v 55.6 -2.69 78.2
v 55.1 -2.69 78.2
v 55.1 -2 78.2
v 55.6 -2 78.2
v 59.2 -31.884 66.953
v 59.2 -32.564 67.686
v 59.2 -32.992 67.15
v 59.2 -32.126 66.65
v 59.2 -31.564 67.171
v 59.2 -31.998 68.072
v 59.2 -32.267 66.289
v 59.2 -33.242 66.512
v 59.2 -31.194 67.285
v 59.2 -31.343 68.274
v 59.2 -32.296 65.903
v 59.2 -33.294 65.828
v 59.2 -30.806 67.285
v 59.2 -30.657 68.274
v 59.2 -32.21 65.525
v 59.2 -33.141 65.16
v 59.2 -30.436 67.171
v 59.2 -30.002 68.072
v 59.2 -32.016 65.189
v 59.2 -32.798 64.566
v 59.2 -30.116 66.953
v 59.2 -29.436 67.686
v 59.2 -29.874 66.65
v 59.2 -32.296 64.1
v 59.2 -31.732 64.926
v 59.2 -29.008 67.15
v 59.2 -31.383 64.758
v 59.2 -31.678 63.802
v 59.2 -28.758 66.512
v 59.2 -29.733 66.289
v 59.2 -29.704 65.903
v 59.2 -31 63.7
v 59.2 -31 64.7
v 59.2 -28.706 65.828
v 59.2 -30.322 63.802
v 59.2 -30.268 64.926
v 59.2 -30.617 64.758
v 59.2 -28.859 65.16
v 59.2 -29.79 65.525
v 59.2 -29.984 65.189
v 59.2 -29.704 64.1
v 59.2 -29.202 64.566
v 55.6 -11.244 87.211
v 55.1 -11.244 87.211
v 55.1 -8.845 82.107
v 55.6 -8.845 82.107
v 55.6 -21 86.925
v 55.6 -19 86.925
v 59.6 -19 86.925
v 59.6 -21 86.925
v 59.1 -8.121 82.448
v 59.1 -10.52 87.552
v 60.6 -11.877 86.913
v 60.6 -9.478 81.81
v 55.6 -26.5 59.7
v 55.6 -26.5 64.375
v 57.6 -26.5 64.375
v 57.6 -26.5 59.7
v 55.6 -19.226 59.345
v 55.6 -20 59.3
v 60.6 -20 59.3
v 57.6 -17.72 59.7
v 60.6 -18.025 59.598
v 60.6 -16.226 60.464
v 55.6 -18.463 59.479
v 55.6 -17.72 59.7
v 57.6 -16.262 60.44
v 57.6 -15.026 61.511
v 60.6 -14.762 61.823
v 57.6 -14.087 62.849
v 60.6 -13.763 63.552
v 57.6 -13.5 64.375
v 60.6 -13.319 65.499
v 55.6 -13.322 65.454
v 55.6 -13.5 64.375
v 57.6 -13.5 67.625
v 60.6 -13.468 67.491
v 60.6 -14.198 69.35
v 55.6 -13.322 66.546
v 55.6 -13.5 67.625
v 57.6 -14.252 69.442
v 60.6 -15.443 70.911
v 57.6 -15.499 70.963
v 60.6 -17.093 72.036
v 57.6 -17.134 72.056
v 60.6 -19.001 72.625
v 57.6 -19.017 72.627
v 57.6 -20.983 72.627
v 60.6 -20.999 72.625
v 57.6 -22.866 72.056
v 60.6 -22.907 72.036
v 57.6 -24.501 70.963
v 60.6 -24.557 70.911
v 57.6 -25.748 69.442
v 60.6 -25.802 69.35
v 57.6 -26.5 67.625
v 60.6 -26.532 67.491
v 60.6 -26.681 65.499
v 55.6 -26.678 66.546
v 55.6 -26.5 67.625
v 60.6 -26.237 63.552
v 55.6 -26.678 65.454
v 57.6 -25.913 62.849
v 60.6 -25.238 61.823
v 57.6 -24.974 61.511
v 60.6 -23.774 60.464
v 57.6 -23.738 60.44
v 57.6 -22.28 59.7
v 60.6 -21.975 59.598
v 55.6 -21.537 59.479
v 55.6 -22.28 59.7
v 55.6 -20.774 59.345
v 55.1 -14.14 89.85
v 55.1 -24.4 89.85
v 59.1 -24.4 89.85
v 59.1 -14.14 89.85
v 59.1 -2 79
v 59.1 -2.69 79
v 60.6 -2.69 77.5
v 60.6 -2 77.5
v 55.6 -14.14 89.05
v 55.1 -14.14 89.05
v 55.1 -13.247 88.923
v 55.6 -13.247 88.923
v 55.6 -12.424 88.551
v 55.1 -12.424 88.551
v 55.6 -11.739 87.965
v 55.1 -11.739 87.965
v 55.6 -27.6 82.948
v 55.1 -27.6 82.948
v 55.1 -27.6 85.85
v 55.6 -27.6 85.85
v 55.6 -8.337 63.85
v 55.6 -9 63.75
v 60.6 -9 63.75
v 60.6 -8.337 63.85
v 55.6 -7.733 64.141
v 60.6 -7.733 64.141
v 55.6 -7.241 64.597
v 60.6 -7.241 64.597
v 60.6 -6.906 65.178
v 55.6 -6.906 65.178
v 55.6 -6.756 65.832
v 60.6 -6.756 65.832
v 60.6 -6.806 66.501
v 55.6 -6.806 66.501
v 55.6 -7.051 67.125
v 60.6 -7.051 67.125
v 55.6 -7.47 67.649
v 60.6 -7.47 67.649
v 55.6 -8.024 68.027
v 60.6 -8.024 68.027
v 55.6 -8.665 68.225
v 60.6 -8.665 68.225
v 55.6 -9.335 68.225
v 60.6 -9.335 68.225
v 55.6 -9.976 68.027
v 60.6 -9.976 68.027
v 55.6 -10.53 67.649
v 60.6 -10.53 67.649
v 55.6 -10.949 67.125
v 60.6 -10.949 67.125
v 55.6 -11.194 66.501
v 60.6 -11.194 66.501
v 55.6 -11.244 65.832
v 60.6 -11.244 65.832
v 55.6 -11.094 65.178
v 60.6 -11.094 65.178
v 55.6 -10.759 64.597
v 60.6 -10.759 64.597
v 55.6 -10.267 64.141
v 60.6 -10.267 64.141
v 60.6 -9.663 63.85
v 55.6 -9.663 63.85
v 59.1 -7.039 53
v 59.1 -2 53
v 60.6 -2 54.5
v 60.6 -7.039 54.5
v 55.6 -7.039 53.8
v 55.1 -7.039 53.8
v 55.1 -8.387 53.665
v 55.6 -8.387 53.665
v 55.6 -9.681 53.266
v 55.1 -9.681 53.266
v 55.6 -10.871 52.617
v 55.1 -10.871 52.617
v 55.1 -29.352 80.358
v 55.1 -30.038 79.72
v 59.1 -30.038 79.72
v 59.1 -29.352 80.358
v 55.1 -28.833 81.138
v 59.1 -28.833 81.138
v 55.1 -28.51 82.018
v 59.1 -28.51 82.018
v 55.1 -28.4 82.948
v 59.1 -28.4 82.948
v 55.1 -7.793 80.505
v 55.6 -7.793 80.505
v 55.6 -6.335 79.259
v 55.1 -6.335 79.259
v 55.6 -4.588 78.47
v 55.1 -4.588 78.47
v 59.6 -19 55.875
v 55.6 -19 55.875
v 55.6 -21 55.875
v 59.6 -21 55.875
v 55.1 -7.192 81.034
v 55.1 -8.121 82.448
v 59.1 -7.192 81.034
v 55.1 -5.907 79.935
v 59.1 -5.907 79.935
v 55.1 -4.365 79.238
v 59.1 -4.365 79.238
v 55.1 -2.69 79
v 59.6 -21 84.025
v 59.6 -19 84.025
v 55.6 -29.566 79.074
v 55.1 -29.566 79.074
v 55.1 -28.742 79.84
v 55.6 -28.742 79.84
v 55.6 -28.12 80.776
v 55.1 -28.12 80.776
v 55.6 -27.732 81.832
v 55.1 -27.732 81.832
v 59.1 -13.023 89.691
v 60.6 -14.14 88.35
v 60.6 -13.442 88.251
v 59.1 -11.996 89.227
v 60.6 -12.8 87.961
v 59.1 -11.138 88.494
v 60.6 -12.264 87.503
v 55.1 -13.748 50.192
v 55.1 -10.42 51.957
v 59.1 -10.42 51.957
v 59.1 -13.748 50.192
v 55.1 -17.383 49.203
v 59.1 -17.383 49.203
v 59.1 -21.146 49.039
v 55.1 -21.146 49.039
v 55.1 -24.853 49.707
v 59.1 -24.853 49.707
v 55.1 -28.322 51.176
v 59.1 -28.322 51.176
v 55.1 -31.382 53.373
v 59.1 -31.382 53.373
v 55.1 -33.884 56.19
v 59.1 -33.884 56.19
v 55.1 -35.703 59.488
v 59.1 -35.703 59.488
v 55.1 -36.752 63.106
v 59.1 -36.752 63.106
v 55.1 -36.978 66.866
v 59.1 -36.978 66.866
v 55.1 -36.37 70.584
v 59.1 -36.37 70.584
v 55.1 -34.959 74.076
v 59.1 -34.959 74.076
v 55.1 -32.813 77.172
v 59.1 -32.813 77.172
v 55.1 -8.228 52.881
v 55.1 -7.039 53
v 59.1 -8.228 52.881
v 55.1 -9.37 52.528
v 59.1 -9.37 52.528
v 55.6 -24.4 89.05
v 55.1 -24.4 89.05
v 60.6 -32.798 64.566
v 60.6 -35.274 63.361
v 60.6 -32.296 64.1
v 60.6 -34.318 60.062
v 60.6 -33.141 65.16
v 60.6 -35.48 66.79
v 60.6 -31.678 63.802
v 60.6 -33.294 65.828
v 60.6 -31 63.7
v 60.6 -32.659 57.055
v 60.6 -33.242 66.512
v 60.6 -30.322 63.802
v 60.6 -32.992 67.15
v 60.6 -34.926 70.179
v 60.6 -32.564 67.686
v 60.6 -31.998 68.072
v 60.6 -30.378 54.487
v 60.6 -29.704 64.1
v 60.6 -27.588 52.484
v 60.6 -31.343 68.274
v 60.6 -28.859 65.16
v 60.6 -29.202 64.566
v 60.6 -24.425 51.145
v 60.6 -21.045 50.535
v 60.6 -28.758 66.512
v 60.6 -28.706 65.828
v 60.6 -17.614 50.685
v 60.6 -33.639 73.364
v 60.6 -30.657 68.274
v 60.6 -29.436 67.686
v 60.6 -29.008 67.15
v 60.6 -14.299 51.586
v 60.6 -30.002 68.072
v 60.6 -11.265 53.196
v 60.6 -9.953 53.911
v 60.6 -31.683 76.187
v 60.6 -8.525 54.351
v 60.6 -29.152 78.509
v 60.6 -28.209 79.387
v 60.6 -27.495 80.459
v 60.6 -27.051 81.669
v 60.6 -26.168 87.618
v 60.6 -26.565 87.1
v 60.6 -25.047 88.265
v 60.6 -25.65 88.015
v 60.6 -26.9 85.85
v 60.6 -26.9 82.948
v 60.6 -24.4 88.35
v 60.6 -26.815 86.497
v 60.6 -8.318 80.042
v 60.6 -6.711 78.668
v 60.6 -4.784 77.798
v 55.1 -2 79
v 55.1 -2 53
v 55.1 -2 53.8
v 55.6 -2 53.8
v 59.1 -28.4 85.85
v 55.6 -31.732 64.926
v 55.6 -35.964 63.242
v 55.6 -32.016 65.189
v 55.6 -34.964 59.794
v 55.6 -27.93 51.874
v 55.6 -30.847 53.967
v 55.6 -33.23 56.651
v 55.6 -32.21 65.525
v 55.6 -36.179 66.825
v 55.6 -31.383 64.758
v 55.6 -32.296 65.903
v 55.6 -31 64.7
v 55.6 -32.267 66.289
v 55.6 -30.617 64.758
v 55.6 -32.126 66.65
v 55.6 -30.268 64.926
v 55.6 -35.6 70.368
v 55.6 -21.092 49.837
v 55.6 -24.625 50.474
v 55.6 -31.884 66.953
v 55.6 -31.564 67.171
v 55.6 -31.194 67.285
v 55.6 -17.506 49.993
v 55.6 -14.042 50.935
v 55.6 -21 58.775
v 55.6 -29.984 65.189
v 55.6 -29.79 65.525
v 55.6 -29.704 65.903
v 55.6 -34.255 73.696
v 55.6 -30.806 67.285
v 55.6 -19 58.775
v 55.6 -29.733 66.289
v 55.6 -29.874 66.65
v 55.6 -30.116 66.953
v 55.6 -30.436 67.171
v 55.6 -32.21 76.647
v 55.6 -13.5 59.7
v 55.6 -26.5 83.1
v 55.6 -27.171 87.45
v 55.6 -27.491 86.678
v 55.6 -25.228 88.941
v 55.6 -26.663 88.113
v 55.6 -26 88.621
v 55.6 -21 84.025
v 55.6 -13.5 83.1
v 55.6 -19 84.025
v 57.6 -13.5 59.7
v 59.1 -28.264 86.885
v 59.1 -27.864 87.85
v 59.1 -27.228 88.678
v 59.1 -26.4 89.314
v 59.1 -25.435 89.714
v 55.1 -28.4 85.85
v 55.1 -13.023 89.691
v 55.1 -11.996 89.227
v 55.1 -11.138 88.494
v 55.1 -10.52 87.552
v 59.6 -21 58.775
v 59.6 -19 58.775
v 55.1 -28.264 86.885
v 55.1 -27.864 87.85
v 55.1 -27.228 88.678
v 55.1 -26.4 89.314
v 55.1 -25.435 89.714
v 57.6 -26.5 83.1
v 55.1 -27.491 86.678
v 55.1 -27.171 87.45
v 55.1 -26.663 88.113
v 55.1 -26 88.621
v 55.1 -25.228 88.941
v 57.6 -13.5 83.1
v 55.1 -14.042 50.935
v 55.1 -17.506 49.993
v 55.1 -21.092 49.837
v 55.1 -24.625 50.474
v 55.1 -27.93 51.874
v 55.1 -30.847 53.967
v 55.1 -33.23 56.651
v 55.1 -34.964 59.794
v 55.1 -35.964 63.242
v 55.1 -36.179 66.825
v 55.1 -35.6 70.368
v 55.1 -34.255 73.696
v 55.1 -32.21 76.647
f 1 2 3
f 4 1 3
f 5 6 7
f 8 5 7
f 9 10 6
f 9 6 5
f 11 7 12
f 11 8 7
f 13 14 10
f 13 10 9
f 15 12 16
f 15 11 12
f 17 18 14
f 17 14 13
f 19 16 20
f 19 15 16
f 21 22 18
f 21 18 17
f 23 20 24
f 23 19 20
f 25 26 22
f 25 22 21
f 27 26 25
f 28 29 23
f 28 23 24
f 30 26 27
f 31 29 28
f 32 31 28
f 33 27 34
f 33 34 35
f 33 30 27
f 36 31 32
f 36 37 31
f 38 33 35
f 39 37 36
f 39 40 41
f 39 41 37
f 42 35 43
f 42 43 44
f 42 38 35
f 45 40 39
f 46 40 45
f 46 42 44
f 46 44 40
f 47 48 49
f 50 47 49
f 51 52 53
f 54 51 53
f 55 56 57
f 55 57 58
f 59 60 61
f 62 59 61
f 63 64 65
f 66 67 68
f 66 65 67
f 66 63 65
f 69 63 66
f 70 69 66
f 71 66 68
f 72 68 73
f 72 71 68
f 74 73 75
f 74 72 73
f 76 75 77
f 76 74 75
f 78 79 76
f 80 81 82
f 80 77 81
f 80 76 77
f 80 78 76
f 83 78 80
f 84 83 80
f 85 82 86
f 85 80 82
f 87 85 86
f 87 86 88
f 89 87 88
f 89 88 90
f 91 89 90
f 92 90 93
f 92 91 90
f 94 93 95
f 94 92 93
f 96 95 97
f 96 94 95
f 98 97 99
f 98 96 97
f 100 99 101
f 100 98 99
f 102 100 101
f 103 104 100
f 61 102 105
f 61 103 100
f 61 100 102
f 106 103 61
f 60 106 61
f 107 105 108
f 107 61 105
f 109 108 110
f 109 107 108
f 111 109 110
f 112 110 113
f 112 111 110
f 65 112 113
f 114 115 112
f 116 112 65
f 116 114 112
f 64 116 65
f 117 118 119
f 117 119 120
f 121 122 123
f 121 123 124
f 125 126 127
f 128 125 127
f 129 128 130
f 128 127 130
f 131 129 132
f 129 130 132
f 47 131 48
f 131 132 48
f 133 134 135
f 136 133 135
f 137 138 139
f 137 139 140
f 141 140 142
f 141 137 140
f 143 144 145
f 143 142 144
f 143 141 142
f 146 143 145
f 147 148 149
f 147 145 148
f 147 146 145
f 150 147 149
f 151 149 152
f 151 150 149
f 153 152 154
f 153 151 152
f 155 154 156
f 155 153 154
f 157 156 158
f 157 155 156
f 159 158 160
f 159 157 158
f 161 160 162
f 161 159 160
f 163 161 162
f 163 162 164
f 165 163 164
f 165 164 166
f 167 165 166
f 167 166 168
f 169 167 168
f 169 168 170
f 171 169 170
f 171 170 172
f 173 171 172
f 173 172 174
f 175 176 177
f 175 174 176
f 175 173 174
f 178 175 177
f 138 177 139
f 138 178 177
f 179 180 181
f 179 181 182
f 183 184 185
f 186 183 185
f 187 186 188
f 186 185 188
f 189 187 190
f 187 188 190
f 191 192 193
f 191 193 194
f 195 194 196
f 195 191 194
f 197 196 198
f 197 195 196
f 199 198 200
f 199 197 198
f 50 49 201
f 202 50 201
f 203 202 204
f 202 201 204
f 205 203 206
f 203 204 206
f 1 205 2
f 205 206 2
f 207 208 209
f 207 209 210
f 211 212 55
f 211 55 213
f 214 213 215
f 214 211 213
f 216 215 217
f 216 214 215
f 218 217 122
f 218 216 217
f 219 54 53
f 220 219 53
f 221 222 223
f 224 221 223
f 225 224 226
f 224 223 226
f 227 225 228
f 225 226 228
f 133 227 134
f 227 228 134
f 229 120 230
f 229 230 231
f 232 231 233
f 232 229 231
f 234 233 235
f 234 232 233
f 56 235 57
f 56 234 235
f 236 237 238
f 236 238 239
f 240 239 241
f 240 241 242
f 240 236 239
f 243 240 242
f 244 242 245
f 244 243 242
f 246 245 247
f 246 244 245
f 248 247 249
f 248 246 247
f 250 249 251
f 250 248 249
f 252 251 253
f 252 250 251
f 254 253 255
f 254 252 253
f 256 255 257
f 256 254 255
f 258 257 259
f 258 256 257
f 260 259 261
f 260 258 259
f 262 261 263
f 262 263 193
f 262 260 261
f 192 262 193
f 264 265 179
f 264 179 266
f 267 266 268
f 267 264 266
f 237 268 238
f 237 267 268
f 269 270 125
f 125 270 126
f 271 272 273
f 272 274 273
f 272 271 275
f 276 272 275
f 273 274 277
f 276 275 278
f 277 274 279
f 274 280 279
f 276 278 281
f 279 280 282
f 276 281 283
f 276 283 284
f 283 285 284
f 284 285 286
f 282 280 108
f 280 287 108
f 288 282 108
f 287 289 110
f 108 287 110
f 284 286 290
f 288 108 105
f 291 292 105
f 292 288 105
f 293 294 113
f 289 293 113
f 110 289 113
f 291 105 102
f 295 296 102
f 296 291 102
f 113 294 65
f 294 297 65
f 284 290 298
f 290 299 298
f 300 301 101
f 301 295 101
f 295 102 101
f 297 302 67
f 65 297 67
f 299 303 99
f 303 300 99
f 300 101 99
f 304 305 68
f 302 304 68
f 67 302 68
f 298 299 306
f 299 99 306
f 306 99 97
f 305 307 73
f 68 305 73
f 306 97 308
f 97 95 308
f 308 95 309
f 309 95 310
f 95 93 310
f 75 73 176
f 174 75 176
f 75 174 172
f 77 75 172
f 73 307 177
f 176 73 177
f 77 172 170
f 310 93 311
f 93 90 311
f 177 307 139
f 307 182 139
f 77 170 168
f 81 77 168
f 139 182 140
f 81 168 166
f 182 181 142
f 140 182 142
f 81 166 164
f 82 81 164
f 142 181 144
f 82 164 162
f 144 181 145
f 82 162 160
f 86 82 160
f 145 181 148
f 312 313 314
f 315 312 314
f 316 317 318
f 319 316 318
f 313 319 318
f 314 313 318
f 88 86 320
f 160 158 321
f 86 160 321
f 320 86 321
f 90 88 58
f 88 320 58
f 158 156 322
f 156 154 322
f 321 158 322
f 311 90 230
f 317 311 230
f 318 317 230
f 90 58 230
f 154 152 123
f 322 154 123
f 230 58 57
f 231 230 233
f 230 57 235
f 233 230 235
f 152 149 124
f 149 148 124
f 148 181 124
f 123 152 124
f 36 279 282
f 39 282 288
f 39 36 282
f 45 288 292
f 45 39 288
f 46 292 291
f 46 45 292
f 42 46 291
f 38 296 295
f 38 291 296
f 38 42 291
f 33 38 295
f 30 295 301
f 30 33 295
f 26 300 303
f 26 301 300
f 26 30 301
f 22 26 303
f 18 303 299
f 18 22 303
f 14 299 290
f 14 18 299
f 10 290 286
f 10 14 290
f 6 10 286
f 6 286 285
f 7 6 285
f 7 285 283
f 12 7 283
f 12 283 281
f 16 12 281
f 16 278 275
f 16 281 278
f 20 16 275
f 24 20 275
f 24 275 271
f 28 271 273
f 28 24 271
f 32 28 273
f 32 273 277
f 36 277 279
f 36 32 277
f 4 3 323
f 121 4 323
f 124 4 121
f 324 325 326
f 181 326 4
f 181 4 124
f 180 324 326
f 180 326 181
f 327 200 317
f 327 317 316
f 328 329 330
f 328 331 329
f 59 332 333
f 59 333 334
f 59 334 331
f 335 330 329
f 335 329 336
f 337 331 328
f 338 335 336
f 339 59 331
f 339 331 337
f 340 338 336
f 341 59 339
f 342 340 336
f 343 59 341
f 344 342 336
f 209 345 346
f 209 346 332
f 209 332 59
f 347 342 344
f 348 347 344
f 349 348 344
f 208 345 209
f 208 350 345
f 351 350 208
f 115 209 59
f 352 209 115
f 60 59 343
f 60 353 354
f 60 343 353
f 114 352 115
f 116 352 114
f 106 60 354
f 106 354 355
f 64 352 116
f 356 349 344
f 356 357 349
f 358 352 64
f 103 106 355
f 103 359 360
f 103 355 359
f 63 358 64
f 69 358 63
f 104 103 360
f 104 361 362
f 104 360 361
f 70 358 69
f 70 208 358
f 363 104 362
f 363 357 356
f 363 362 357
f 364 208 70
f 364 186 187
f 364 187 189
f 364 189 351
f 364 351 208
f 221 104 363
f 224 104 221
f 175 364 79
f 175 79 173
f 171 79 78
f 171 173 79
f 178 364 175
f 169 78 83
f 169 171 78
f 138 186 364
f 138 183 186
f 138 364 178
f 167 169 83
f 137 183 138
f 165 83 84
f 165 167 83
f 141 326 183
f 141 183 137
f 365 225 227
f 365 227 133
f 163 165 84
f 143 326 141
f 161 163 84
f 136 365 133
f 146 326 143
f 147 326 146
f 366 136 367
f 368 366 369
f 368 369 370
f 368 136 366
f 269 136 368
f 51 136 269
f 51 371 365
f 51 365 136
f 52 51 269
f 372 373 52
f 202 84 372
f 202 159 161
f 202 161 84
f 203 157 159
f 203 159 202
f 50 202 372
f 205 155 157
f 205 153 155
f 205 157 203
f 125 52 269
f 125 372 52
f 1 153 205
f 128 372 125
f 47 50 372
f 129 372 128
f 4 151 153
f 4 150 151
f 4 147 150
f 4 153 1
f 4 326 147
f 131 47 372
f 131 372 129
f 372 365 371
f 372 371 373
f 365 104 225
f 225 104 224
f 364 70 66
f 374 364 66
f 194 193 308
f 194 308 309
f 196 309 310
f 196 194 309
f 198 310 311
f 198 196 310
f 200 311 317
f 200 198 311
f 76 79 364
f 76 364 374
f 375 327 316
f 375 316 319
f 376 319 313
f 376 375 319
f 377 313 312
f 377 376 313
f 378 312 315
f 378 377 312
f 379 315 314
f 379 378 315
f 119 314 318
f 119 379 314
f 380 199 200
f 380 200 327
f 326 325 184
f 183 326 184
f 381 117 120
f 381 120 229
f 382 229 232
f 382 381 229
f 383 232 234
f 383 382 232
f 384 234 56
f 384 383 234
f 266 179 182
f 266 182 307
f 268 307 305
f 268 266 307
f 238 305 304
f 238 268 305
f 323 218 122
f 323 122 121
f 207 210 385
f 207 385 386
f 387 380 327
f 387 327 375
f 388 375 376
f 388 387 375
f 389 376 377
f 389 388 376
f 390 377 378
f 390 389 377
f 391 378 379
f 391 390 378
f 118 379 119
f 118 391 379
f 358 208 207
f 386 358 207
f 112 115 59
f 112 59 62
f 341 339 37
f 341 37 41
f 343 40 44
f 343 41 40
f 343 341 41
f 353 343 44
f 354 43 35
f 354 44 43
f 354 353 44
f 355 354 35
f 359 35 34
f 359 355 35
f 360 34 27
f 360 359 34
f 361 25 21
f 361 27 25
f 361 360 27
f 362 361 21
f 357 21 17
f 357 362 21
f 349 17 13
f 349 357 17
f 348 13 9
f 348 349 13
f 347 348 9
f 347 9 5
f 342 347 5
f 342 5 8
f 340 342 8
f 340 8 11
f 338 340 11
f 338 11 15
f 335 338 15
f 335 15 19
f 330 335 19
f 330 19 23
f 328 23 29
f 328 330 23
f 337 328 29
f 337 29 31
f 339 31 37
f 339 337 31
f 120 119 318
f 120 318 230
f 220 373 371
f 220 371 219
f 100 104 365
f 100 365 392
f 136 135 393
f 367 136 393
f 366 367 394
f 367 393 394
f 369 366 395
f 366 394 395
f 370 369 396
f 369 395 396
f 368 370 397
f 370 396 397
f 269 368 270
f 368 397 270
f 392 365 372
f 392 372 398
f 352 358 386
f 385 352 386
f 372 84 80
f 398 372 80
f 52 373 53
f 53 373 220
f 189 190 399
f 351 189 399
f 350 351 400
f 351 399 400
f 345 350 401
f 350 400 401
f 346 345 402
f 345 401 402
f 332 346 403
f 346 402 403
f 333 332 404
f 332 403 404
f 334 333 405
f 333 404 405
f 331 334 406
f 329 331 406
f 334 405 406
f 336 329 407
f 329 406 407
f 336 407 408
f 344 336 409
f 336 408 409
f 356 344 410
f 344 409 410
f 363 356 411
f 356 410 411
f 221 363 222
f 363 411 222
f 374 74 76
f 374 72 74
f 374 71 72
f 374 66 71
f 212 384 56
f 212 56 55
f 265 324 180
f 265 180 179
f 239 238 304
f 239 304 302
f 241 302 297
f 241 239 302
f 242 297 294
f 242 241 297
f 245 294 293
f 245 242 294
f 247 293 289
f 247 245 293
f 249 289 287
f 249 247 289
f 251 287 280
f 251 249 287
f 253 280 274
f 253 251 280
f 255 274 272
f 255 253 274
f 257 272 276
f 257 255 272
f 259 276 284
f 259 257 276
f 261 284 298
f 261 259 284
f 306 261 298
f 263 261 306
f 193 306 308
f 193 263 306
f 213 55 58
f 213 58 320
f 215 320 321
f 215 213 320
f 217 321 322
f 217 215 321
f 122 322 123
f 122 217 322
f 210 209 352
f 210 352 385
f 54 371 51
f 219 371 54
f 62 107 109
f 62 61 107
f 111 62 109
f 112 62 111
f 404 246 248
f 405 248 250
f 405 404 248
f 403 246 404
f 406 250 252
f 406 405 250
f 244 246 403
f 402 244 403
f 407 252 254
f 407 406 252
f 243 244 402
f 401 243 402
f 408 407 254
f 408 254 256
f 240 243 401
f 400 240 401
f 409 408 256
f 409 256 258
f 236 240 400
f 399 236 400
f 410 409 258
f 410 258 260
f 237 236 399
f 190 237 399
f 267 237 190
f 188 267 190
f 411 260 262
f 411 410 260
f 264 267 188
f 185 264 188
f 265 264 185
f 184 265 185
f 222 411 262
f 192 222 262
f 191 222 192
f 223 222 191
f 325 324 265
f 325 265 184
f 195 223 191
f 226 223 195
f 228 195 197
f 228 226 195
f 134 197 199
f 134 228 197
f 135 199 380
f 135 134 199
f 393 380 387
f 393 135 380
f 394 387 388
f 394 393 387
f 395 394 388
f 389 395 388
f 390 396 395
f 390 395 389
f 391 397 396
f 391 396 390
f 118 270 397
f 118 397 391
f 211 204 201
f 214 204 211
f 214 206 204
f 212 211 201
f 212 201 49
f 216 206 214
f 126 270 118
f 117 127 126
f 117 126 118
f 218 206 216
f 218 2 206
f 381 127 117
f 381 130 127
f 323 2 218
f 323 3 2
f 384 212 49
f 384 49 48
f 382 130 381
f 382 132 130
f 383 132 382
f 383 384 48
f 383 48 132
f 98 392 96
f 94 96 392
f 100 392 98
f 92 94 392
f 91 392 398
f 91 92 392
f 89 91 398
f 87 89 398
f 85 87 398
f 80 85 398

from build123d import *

# Parameters (mm, degrees)
BOSS_EXTRUDE1_START  = 55.1
BOSS_EXTRUDE1_DEPTH  = 5.5
BOSS_EXTRUDE2_START  = 55
BOSS_EXTRUDE2_DEPTH  = 0.6
CHAMFER1_SIZE        = 1.5
BOSS_EXTRUDE3_START  = 55.875
SKETCH3_W            = 4.1
SKETCH3_H            = 2
BOSS_EXTRUDE3_DEPTH  = 2.9
BOSS_EXTRUDE4_START  = 84.025
SKETCH4_W            = 4.1
SKETCH4_H            = 2
BOSS_EXTRUDE4_DEPTH  = 2.9
BOSS_EXTRUDE5_START  = 59.7
SKETCH5_W            = 2.1
SKETCH5_H            = 13
BOSS_EXTRUDE5_DEPTH  = 23.4
BOSS_EXTRUDE6_START  = 55.5
SKETCH6_R            = 6.7
BOSS_EXTRUDE6_DEPTH  = 5.6
BOSS_EXTRUDE7_START  = 55.5
SKETCH7_R            = 2.25
BOSS_EXTRUDE7_DEPTH  = 5.6
BOSS_EXTRUDE8_START  = 59.2
SKETCH8_R            = 2.3
BOSS_EXTRUDE8_DEPTH  = 1.9
BOSS_EXTRUDE9_START  = 55.5
SKETCH9_R            = 1.3
BOSS_EXTRUDE9_DEPTH  = 3.75
BOSS_EXTRUDE10_START = 26
SKETCH10_W           = 30
SKETCH10_H           = 62
BOSS_EXTRUDE10_DEPTH = 80


with BuildPart() as part:
    # Sketch1 → Boss-Extrude1 (new body)
    with BuildSketch(Plane(origin=(0, 0, 0), x_dir=(0, 0, -1), z_dir=(1, 0, 0)).offset(BOSS_EXTRUDE1_START)):
        with BuildLine():
            Line((-53, 3.337121701), (-53, -7.038518603))
            ThreePointArc((-53, -7.038518603), (-52.733198515, -8.807822077), (-51.956521739, -10.41977462))
            ThreePointArc((-51.956521739, -10.41977462), (-56.18950583, -33.883594784), (-79.719936005, -30.038095238))
            ThreePointArc((-79.719936005, -30.038095238), (-81.138131249, -28.832955071), (-82.948156242, -28.4))
            Line((-82.948156242, -28.4), (-85.85, -28.4))
            ThreePointArc((-85.85, -28.4), (-88.678427125, -27.228427125), (-89.85, -24.4))
            Line((-89.85, -24.4), (-89.85, -14.139667829))
            ThreePointArc((-89.85, -14.139667829), (-89.226856881, -11.995644133), (-87.551581196, -10.519637244))
            Line((-87.551581196, -10.519637244), (-82.447628205, -8.120544133))
            ThreePointArc((-82.447628205, -8.120544133), (-79.934714679, -5.9065338), (-79, -2.690498257))
            Line((-79, -2.690498257), (-79, 3.337121701))
            ThreePointArc((-79, 3.337121701), (-79.321091654, 5.273613374), (-80.25, 7.002841276))
            ThreePointArc((-80.25, 7.002841276), (-66, 36), (-51.75, 7.002841276))
            ThreePointArc((-51.75, 7.002841276), (-52.678908346, 5.273613374), (-53, 3.337121701))
        make_face()
    extrude(amount=BOSS_EXTRUDE1_DEPTH)


with BuildPart() as body_2:
    # Sketch2 → Boss-Extrude2 (new body)
    with BuildSketch(Plane(origin=(0, 0, 0), x_dir=(0, 0, -1), z_dir=(1, 0, 0)).offset(BOSS_EXTRUDE2_START)):
        with BuildLine():
            Line((-53.8, 3.337121701), (-53.8, -7.038518603))
            ThreePointArc((-53.8, -7.038518603), (-53.497624984, -9.043729207), (-52.617391304, -10.870608755))
            ThreePointArc((-52.617391304, -10.870608755), (-56.651176143, -33.230249147), (-79.074291958, -29.565714286))
            ThreePointArc((-79.074291958, -29.565714286), (-80.77612625, -28.119546085), (-82.948156242, -27.6))
            Line((-82.948156242, -27.6), (-85.85, -27.6))
            ThreePointArc((-85.85, -27.6), (-88.1127417, -26.6627417), (-89.05, -24.4))
            Line((-89.05, -24.4), (-89.05, -14.139667829))
            ThreePointArc((-89.05, -14.139667829), (-88.551485505, -12.424448872), (-87.211264957, -11.243643361))
            Line((-87.211264957, -11.243643361), (-82.107311966, -8.84455025))
            ThreePointArc((-82.107311966, -8.84455025), (-79.259343303, -6.335338539), (-78.2, -2.690498257))
            Line((-78.2, -2.690498257), (-78.2, 3.337121701))
            ThreePointArc((-78.2, 3.337121701), (-78.563903875, 5.531812264), (-79.616666667, 7.491603886))
            ThreePointArc((-79.616666667, 7.491603886), (-66, 35.2), (-52.383333333, 7.491603886))
            ThreePointArc((-52.383333333, 7.491603886), (-53.436096125, 5.531812264), (-53.8, 3.337121701))
        make_face()
    extrude(amount=BOSS_EXTRUDE2_DEPTH)


with BuildPart() as part_1:
    add(part.part)

    # Combine1: cut body 2
    add(body_2.part, mode=Mode.SUBTRACT)

    # Chamfer1
    chamfer1_edges = [part_1.edges().sort_by_distance(p)[0] for p in [
        (60.6, -5.9065338, 79.934714679),
        (60.6, -9.320090689, 84.999604701),
        (60.6, -11.995644133, 89.226856881),
        (60.6, -19.269833914, 89.85),
        (60.6, -27.228427125, 88.678427125),
        (60.6, -28.4, 84.399078121),
        (60.6, -28.832955071, 81.138131249),
        (60.6, -33.883594784, 56.18950583),
        (60.6, -8.807822077, 52.733198515),
        (60.6, -1.850698451, 53),
        (60.6, 5.273613374, 79.321091654),
        (60.6, 5.273613374, 52.678908346),
        (60.6, 36, 66),
        (60.6, 0.323311722, 79),
    ]]
    chamfer(chamfer1_edges, length=CHAMFER1_SIZE)


with BuildPart() as body_2_2:
    # Sketch3 → Boss-Extrude3 (new body)
    with BuildSketch(Plane.XY.offset(BOSS_EXTRUDE3_START)):
        with Locations((57.55, -20)):
            Rectangle(SKETCH3_W, SKETCH3_H)
    extrude(amount=BOSS_EXTRUDE3_DEPTH)


with BuildPart() as part_2:
    add(part_1.part)

    # Combine2: cut body 2 2
    add(body_2_2.part, mode=Mode.SUBTRACT)


with BuildPart() as body_2_3:
    # Sketch4 → Boss-Extrude4 (new body)
    with BuildSketch(Plane.XY.offset(BOSS_EXTRUDE4_START)):
        with Locations((57.55, -20)):
            Rectangle(SKETCH4_W, SKETCH4_H)
    extrude(amount=BOSS_EXTRUDE4_DEPTH)


with BuildPart() as part_3:
    add(part_2.part)

    # Combine3: cut body 2 3
    add(body_2_3.part, mode=Mode.SUBTRACT)


with BuildPart() as body_2_4:
    # Sketch5 → Boss-Extrude5 (new body)
    with BuildSketch(Plane.XY.offset(BOSS_EXTRUDE5_START)):
        with Locations((56.55, -20)):
            Rectangle(SKETCH5_W, SKETCH5_H)
    extrude(amount=BOSS_EXTRUDE5_DEPTH)


with BuildPart() as part_4:
    add(part_3.part)

    # Combine4: cut body 2 4
    add(body_2_4.part, mode=Mode.SUBTRACT)


with BuildPart() as body_2_5:
    # Sketch6 → Boss-Extrude6 (new body)
    with BuildSketch(Plane(origin=(0, 0, 0), x_dir=(0, 0, -1), z_dir=(1, 0, 0)).offset(BOSS_EXTRUDE6_START)):
        with Locations((-66, -20)):
            Circle(SKETCH6_R)
    extrude(amount=BOSS_EXTRUDE6_DEPTH)


with BuildPart() as part_5:
    add(part_4.part)

    # Combine5: cut body 2 5
    add(body_2_5.part, mode=Mode.SUBTRACT)


with BuildPart() as body_2_6:
    # Sketch7 → Boss-Extrude7 (new body)
    with BuildSketch(Plane(origin=(0, 0, 0), x_dir=(0, 0, -1), z_dir=(1, 0, 0)).offset(BOSS_EXTRUDE7_START)):
        with Locations((-66, -9)):
            Circle(SKETCH7_R)
    extrude(amount=BOSS_EXTRUDE7_DEPTH)


with BuildPart() as part_6:
    add(part_5.part)

    # Combine6: cut body 2 6
    add(body_2_6.part, mode=Mode.SUBTRACT)


with BuildPart() as body_2_7:
    # Sketch8 → Boss-Extrude8 (new body)
    with BuildSketch(Plane(origin=(0, 0, 0), x_dir=(0, 0, -1), z_dir=(1, 0, 0)).offset(BOSS_EXTRUDE8_START)):
        with Locations((-66, -31)):
            Circle(SKETCH8_R)
    extrude(amount=BOSS_EXTRUDE8_DEPTH)


with BuildPart() as part_7:
    add(part_6.part)

    # Combine7: cut body 2 7
    add(body_2_7.part, mode=Mode.SUBTRACT)


with BuildPart() as body_2_8:
    # Sketch9 → Boss-Extrude9 (new body)
    with BuildSketch(Plane(origin=(0, 0, 0), x_dir=(0, 0, -1), z_dir=(1, 0, 0)).offset(BOSS_EXTRUDE9_START)):
        with Locations((-66, -31)):
            Circle(SKETCH9_R)
    extrude(amount=BOSS_EXTRUDE9_DEPTH)


with BuildPart() as part_8:
    add(part_7.part)

    # Combine8: cut body 2 8
    add(body_2_8.part, mode=Mode.SUBTRACT)


with BuildPart() as body_2_9:
    # Sketch10 → Boss-Extrude10 (new body)
    with BuildSketch(Plane.XY.offset(BOSS_EXTRUDE10_START)):
        with Locations((55, 29)):
            Rectangle(SKETCH10_W, SKETCH10_H)
    extrude(amount=BOSS_EXTRUDE10_DEPTH)


with BuildPart() as part_9:
    add(part_8.part)

    # Combine9: cut body 2 9
    add(body_2_9.part, mode=Mode.SUBTRACT)


solid = part_9.part
